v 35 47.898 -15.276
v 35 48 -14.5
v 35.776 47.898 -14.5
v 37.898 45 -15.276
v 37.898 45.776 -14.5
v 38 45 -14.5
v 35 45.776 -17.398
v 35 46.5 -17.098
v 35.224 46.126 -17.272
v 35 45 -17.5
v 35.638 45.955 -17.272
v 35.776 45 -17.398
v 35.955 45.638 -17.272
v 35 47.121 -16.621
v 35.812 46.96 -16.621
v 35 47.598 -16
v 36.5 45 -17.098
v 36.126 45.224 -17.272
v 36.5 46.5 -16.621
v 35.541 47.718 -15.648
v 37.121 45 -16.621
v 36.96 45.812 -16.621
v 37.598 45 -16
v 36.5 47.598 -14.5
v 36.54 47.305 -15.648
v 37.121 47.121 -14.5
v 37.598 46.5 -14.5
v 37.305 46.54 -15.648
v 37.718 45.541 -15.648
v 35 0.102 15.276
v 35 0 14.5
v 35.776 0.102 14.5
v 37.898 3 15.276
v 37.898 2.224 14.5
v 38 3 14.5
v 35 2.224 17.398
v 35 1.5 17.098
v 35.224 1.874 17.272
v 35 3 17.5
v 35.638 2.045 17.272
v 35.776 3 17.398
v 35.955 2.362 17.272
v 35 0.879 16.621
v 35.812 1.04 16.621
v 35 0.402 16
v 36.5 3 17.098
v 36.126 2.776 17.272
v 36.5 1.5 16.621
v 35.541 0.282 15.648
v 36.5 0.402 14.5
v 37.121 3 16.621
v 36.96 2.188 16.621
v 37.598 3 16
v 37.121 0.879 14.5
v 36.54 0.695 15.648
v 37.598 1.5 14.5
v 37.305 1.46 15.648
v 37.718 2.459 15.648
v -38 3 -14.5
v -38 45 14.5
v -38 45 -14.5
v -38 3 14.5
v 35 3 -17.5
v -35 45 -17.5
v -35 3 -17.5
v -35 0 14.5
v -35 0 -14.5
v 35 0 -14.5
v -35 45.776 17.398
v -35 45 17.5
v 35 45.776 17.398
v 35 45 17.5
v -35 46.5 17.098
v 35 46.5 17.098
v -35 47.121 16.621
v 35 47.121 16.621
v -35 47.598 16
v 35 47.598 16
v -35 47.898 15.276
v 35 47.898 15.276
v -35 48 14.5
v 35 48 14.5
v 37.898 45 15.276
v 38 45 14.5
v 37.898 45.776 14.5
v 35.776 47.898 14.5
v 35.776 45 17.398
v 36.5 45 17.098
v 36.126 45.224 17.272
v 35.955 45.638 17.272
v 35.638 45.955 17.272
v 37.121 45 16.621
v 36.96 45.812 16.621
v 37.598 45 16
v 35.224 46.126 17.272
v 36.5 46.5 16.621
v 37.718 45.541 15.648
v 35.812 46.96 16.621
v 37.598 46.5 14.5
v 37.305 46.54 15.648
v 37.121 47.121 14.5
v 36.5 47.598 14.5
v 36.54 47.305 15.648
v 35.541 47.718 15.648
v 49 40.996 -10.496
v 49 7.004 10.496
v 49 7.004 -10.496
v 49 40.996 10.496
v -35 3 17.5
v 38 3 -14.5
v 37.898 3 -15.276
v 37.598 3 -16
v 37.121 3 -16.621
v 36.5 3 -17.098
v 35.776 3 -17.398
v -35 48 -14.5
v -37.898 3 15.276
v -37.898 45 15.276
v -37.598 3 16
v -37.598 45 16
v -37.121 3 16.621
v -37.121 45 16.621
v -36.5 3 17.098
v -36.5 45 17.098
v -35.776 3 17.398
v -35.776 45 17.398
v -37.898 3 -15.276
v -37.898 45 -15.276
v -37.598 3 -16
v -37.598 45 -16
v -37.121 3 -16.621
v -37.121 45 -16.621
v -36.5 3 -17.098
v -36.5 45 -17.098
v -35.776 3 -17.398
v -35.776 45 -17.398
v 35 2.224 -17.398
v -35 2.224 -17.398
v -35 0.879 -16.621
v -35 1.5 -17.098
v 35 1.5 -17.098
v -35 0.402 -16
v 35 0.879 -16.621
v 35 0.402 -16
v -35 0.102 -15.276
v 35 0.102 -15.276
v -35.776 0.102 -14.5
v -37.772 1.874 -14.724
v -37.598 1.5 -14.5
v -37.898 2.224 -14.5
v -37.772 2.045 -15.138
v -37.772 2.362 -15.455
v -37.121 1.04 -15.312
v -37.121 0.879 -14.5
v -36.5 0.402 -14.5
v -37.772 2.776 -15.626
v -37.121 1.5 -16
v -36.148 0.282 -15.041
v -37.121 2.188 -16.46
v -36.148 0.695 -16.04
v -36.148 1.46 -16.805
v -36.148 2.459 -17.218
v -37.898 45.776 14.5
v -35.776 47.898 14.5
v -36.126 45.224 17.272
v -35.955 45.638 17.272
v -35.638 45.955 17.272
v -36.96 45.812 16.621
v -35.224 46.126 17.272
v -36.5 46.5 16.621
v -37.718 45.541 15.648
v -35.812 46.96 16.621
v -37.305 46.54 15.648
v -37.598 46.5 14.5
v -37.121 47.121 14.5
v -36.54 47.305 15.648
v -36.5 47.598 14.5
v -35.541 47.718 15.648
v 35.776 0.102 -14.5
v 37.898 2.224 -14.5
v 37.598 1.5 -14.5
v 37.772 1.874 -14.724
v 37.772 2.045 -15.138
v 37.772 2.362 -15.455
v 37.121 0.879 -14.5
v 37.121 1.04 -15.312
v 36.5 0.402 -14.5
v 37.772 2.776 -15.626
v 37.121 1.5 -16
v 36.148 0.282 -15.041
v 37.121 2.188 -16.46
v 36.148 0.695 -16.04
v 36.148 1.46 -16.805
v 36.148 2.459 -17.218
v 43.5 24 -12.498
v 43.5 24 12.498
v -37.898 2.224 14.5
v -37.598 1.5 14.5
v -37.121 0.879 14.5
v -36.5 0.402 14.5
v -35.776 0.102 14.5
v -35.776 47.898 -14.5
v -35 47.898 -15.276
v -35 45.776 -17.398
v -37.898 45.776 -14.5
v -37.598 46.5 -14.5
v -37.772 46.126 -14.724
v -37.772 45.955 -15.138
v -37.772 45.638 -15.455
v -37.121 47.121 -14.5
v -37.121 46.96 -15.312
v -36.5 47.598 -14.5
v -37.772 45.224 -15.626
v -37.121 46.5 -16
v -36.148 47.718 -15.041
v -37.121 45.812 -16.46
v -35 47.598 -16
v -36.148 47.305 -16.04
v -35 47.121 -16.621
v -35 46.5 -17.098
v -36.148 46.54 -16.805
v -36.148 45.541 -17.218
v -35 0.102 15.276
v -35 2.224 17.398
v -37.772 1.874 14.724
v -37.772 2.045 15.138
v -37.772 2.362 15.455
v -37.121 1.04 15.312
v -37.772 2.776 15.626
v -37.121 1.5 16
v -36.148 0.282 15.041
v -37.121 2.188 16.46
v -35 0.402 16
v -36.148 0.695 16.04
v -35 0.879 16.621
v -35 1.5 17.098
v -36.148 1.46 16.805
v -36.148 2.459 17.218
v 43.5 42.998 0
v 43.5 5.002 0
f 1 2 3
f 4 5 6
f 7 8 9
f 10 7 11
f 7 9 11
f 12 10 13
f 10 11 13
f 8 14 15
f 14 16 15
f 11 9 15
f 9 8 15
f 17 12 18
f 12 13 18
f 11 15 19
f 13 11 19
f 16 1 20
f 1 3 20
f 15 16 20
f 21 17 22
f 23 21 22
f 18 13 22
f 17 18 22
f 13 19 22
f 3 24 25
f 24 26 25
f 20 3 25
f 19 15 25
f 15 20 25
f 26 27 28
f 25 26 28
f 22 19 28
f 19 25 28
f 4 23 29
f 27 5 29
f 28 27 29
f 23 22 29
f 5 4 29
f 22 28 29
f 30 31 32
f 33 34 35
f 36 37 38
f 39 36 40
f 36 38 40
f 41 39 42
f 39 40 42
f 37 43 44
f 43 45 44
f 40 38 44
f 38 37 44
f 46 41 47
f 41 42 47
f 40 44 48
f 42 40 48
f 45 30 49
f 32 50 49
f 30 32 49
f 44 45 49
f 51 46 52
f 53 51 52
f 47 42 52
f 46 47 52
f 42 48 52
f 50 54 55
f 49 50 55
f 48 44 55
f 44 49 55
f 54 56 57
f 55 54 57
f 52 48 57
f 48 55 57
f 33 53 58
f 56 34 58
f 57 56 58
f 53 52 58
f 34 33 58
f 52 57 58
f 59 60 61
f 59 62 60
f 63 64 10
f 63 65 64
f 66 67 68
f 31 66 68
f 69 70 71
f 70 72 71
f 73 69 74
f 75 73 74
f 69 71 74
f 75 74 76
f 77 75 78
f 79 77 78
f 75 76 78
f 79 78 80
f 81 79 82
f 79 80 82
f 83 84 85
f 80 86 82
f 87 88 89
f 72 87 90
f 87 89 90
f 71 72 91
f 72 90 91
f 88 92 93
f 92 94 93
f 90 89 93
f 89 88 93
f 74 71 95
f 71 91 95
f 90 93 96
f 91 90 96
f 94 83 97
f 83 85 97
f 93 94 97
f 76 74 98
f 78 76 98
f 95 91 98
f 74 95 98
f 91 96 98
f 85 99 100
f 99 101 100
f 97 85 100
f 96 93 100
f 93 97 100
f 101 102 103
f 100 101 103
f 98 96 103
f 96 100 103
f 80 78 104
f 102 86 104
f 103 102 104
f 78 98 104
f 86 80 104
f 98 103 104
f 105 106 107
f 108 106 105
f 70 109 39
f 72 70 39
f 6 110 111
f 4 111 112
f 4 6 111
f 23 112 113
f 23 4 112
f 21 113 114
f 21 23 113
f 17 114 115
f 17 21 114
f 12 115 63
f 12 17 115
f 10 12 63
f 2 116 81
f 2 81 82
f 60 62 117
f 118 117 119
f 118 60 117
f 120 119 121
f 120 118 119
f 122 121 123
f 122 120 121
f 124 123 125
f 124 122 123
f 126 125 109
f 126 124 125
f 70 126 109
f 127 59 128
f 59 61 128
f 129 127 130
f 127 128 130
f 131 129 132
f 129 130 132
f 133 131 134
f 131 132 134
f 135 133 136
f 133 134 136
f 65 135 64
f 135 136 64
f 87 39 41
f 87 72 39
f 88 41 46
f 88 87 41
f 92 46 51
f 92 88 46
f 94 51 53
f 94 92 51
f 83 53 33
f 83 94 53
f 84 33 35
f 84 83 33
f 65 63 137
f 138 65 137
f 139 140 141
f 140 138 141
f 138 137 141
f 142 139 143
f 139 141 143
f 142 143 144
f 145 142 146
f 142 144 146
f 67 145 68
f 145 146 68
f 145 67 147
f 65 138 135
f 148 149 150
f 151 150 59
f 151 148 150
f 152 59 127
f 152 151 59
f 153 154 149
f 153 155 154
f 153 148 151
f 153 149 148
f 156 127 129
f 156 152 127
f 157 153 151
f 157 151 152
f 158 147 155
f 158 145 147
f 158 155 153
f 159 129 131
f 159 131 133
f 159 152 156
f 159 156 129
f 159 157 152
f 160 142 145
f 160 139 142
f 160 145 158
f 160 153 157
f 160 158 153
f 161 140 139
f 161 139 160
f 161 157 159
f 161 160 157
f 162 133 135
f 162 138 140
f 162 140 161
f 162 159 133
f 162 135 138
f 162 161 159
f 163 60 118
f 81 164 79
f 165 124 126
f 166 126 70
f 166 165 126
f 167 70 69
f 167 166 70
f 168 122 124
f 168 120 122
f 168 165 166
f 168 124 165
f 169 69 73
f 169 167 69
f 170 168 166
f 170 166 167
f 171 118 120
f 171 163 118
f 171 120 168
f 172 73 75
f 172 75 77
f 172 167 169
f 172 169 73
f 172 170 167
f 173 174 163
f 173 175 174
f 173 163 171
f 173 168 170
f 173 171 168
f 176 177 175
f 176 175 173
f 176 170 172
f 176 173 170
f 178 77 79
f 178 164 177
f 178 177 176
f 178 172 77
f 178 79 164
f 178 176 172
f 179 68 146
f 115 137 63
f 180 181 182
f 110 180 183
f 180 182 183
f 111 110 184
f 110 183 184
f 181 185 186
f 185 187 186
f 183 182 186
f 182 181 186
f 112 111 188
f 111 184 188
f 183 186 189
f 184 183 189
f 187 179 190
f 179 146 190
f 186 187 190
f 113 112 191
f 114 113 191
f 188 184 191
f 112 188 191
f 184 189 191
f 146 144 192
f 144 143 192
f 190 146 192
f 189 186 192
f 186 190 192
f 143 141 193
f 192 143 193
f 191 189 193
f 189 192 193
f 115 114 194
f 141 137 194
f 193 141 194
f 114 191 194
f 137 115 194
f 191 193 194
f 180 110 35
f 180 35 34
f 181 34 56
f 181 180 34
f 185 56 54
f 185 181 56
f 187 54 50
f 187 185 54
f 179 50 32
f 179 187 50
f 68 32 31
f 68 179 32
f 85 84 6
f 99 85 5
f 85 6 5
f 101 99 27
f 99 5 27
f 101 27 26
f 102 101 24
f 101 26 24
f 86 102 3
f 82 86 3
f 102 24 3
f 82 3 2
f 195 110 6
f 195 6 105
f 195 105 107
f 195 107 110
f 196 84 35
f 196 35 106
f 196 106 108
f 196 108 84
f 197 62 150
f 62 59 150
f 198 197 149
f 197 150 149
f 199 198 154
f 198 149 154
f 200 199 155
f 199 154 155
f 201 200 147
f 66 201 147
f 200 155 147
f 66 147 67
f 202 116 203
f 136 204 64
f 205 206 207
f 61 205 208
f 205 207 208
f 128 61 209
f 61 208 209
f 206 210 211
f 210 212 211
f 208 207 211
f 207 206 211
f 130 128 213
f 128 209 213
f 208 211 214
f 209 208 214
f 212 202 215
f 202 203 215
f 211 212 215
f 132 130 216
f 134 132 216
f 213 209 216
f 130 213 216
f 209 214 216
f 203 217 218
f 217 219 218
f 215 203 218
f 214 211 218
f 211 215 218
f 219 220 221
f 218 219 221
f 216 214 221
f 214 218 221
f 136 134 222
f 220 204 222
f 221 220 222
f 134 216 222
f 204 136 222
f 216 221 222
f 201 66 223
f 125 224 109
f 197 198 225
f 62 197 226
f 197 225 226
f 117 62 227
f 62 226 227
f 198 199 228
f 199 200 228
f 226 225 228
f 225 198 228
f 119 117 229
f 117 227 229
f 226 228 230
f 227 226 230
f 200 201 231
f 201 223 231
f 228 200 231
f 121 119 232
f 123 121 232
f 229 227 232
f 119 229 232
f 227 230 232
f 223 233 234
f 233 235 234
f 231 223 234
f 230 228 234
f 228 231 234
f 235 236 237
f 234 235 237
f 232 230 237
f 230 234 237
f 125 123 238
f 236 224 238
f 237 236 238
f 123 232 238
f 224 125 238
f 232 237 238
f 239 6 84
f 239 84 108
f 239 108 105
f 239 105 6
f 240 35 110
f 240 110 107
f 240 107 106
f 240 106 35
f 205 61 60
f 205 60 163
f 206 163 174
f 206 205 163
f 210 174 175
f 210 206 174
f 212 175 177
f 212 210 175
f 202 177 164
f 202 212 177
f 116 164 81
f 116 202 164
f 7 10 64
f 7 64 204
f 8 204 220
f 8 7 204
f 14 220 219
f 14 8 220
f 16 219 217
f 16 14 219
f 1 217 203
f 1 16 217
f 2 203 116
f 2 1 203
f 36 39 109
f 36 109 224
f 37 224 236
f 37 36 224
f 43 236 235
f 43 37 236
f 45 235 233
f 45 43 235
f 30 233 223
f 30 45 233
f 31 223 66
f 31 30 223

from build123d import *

# Parameters (mm, degrees)
ESBO_O1_W                = 76
ESBO_O1_H                = 35
RESSALTO_EXTRUS_O1_DEPTH = 48
FILETE1_R                = 3
ESBO_O11_W               = 29
ESBO_O11_H               = 42
RESSALTO_EXTRUS_O2_DEPTH = 11
RESSALTO_EXTRUS_O2_TAPER = 20


with BuildPart() as part:
    # Esboço1 → Ressalto-extrusão1 (new body)
    with BuildSketch(Plane(origin=(0, 0, 0), x_dir=(1, 0, 0), z_dir=(0, 1, 0))):
        Rectangle(ESBO_O1_W, ESBO_O1_H)
    extrude(amount=RESSALTO_EXTRUS_O1_DEPTH)

    # Filete1
    filete1_edges = [part.edges().sort_by_distance(p)[0] for p in [
        (38, 48, 0),
        (0, 48, -17.5),
        (-38, 48, 0),
        (0, 0, -17.5),
        (38, 0, 0),
        (0, 0, 17.5),
        (-38, 0, 0),
        (-38, 24, -17.5),
        (38, 24, -17.5),
        (38, 24, 17.5),
        (-38, 24, 17.5),
        (0, 48, 17.5),
    ]]
    fillet(filete1_edges, radius=FILETE1_R)

    # Esboço11 → Ressalto-extrusão2 (add)
    with BuildSketch(Plane(origin=(38, 0, 0), x_dir=(0, 0, -1), z_dir=(1, 0, 0))):
        with Locations((0, 24)):
            Rectangle(ESBO_O11_W, ESBO_O11_H)
    extrude(amount=RESSALTO_EXTRUS_O2_DEPTH, taper=RESSALTO_EXTRUS_O2_TAPER)


solid = part.part
